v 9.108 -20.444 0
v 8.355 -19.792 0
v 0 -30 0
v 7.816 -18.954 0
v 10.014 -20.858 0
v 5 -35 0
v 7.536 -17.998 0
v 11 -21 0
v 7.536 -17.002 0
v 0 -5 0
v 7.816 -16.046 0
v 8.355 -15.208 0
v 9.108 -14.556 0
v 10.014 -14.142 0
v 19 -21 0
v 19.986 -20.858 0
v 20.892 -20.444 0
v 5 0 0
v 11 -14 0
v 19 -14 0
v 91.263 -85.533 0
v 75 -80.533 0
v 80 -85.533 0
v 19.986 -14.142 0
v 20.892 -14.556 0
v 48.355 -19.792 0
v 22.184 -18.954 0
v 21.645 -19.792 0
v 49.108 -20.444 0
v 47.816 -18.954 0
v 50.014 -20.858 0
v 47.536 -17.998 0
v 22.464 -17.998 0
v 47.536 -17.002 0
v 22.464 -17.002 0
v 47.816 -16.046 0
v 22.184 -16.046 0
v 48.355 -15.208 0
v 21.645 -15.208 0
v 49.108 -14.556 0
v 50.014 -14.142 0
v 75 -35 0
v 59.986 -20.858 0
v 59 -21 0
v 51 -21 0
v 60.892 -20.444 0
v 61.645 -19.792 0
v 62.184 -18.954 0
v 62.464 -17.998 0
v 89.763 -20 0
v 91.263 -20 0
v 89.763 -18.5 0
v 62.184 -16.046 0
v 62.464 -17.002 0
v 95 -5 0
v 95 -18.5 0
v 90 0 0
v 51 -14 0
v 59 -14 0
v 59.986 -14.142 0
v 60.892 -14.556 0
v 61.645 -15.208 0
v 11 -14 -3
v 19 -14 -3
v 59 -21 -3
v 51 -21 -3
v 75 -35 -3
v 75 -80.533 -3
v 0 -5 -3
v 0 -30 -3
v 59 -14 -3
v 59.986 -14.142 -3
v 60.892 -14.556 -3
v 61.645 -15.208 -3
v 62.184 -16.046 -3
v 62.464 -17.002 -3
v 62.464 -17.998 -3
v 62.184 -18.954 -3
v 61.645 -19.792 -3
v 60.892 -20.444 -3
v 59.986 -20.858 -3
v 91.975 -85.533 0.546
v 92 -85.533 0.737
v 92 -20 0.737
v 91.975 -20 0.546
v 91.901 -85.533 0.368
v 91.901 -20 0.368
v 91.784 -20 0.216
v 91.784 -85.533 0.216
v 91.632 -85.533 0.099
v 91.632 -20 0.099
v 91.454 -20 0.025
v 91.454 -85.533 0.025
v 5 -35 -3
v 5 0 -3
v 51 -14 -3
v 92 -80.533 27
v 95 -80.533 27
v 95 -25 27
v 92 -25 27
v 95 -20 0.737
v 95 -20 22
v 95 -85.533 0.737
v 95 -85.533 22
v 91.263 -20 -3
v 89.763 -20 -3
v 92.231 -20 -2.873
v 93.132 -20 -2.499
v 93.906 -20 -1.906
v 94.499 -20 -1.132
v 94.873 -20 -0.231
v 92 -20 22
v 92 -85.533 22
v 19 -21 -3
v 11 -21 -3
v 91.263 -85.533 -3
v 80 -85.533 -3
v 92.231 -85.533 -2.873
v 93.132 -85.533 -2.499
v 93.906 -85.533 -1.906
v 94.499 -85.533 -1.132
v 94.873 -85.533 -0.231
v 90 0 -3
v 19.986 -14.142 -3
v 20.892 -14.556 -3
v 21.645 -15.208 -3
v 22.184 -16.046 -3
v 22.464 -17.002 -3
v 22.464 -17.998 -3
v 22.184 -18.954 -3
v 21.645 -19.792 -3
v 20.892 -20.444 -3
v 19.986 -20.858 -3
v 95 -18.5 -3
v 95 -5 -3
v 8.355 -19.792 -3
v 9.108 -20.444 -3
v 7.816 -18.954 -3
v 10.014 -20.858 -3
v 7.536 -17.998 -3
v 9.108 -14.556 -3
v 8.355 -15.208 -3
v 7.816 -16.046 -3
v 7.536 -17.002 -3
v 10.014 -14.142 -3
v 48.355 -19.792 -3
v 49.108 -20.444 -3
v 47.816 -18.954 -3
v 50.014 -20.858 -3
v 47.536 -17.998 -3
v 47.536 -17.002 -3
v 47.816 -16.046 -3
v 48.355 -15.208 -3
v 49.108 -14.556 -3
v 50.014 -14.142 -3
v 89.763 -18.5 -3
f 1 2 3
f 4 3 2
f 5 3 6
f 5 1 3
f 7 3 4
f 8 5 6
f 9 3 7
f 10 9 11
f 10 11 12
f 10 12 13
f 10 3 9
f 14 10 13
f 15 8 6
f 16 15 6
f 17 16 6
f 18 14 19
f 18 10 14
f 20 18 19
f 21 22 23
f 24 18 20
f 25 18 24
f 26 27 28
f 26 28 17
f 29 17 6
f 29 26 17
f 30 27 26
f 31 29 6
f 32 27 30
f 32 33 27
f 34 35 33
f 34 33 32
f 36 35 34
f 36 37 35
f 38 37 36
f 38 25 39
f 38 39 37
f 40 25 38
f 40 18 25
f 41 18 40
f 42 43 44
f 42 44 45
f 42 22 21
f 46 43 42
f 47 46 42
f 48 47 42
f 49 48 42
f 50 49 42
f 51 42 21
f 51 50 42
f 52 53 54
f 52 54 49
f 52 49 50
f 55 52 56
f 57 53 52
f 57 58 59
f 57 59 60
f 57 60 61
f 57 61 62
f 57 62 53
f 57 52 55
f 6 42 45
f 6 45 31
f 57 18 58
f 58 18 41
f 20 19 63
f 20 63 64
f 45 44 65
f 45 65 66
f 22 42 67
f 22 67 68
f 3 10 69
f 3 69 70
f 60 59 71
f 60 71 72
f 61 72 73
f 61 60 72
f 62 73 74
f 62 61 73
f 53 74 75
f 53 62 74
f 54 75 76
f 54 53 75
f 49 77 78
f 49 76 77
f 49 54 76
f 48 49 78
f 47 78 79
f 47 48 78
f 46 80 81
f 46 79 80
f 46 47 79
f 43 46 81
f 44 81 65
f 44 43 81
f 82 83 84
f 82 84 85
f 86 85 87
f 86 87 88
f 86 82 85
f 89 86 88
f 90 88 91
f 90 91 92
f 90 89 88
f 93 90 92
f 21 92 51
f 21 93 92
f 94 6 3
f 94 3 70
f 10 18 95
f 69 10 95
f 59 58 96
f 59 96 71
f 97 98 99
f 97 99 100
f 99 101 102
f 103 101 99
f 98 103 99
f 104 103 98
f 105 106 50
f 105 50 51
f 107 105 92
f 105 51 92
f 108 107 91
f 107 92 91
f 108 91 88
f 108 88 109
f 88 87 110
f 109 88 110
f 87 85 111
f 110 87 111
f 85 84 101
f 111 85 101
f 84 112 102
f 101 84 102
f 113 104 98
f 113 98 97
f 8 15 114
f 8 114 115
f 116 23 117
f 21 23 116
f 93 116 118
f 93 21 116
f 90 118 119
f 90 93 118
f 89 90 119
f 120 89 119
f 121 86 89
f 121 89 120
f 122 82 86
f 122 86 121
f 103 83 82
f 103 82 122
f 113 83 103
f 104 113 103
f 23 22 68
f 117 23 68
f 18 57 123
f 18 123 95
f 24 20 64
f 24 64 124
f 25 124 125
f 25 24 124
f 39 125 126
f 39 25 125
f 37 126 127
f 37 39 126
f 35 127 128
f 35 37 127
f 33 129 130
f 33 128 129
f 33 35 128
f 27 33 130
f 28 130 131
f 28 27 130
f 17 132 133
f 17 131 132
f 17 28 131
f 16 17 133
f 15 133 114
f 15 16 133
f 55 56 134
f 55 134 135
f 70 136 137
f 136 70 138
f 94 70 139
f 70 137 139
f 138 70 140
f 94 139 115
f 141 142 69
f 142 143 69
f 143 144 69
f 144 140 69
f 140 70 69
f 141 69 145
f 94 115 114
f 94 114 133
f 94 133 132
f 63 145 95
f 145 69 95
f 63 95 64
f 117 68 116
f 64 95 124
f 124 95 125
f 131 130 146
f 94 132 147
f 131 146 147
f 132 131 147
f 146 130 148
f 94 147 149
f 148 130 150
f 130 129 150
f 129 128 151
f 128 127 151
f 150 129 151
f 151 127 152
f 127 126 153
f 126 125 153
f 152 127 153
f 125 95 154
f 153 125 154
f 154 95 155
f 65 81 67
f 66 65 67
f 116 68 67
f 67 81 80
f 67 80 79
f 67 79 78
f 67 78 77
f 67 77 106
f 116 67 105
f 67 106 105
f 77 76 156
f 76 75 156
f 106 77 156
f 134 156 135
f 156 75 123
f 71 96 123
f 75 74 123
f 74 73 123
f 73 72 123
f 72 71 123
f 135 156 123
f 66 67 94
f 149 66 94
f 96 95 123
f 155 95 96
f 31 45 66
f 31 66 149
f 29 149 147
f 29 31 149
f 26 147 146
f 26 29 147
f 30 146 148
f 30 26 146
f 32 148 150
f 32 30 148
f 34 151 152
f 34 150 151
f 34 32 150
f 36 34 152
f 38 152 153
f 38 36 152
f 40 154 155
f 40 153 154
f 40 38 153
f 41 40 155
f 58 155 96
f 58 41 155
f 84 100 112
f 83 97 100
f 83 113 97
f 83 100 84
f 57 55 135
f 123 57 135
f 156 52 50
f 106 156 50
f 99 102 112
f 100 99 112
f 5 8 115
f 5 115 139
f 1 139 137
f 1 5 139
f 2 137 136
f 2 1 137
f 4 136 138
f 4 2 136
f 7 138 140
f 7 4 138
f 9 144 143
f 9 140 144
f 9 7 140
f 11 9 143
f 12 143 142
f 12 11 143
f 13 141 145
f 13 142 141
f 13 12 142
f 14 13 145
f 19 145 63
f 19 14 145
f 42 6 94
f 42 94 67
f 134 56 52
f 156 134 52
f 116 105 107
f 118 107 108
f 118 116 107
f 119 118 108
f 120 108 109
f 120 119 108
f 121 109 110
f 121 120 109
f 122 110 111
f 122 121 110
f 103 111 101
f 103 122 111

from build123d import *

# Parameters (mm, degrees)
SM_BASE_FLANGE_1_DEPTH            = 3
SM_EDGE_FLANGE_1_STRIP_W          = 13.4732
SM_EDGE_FLANGE_1_STRIP_H          = 3
SM_EDGE_FLANGE_1_STRIP_CUT_DEPTH  = 65.533094289
SM_EDGE_FLANGE_1_RELIEF_W         = 14.9732
SM_EDGE_FLANGE_1_RELIEF_H         = 1.5
SM_EDGE_FLANGE_1_RELIEF_CUT_DEPTH = 3
SM_EDGE_FLANGE_1_DEPTH            = 65.533094289
CHAMFER_1_SIZE                    = 5
CUT_EXTRUDE_1_DEPTH               = 10


# Sheet-metal steps are written as plain solids
with BuildPart() as part:
    # Sketch 1 → 基体-法兰1 (new body)
    with BuildSketch(Plane.XY):
        Polygon((75, -35), (75, -85.533094289), (95, -85.533094289), (95, 0), (0, 0), (0, -35), align=None)
    extrude(amount=-SM_BASE_FLANGE_1_DEPTH)

    # 边线-法兰1 strip (across the edge) → 边线-法兰1 strip cut (cut)
    with BuildSketch(Plane(origin=(95, -85.533094289, 0), x_dir=(-1, 0, 0), z_dir=(0, 1, 0))):
        with Locations((-3, -1.5)):
            Rectangle(SM_EDGE_FLANGE_1_STRIP_W, SM_EDGE_FLANGE_1_STRIP_H)
    extrude(amount=SM_EDGE_FLANGE_1_STRIP_CUT_DEPTH, mode=Mode.SUBTRACT)

    # 边线-法兰1 relief (on the sheet) → 边线-法兰1 relief cut (cut)
    with BuildSketch(Plane(origin=(91.2634, -85.533094289, 0), x_dir=(-1, 0, 0), z_dir=(0, 0, 1))):
        with Locations((-5.9866, -66.283094289)):
            Rectangle(SM_EDGE_FLANGE_1_RELIEF_W, SM_EDGE_FLANGE_1_RELIEF_H)
    extrude(amount=-SM_EDGE_FLANGE_1_RELIEF_CUT_DEPTH, mode=Mode.SUBTRACT)

    # 边线-法兰1 section (across the edge) → 边线-法兰1 (add)
    with BuildSketch(Plane(origin=(95, -85.533094289, 0), x_dir=(-1, 0, 0), z_dir=(0, 1, 0))):
        with BuildLine():
            Line((0, 0.7366), (0, 27))
            Line((0, 27), (3, 27))
            Line((3, 27), (3, 0.7366))
            ThreePointArc((3, 0.7366), (3.215745145, 0.215745145), (3.7366, 0))
            Line((3.7366, 0), (3.7366, -3))
            ThreePointArc((3.7366, -3), (1.094424801, -1.905575199), (0, 0.7366))
        make_face()
    extrude(amount=SM_EDGE_FLANGE_1_DEPTH)

    # 倒角1
    chamfer_1_edges = [part.edges().sort_by_distance(p)[0] for p in [
        (0, 0, -1.5),
        (95, 0, -1.5),
        (75, -85.533094289, -1.5),
        (0, -35, -1.5),
        (93.5, -85.533094289, 27),
        (93.5, -20, 27),
    ]]
    chamfer(chamfer_1_edges, length=CHAMFER_1_SIZE)

    # 草图10 → 切除-拉伸1 (cut)
    with BuildSketch(Plane.XY):
        with BuildLine():
            Line((11, -14), (19, -14))
            ThreePointArc((19, -14), (22.5, -17.5), (19, -21))
            Line((19, -21), (11, -21))
            ThreePointArc((11, -21), (7.5, -17.5), (11, -14))
        make_face()
        with BuildLine():
            Line((51, -14), (59, -14))
            ThreePointArc((59, -14), (62.5, -17.5), (59, -21))
            Line((59, -21), (51, -21))
            ThreePointArc((51, -21), (47.5, -17.5), (51, -14))
        make_face()
    extrude(amount=-CUT_EXTRUDE_1_DEPTH, mode=Mode.SUBTRACT)


solid = part.part
